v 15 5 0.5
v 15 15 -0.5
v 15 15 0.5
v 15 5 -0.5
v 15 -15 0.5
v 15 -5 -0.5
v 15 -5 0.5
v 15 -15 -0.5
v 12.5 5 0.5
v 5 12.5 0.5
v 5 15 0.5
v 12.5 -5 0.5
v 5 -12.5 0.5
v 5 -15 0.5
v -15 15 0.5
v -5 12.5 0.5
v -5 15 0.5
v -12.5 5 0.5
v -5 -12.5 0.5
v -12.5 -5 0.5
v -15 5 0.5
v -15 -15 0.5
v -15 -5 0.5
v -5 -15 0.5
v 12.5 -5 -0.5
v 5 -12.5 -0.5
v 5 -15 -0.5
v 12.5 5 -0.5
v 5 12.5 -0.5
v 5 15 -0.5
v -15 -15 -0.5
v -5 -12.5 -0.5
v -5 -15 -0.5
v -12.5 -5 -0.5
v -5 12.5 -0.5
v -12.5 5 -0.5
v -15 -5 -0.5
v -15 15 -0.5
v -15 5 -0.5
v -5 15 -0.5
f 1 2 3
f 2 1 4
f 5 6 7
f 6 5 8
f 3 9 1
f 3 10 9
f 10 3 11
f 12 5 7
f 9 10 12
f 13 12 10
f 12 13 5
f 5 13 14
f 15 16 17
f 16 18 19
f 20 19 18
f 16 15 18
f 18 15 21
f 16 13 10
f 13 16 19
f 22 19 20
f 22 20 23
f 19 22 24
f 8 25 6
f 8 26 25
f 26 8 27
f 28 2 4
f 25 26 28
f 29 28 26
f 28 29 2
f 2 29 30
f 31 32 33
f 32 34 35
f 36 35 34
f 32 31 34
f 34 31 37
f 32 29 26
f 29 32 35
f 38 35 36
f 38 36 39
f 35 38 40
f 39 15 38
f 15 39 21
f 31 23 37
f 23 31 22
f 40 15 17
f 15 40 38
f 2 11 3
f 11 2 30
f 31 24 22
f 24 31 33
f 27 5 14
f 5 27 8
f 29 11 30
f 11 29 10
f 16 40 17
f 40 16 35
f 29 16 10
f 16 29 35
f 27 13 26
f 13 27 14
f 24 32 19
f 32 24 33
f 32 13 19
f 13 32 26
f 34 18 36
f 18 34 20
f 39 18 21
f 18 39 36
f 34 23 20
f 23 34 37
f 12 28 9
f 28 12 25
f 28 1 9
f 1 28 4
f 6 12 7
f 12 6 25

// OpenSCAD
module tabbed_plate() {
    difference() {
        // Main plate
        cube([30, 30, 1], center=true);
        
        // Top tab
        translate([0, 15, 0])
            cube([10, 5, 1], center=true);
        
        // Bottom tab
        translate([0, -15, 0])
            cube([10, 5, 1], center=true);
        
        // Left tab
        translate([-15, 0, 0])
            cube([5, 10, 1], center=true);
        
        // Right tab
        translate([15, 0, 0])
            cube([5, 10, 1], center=true);
    }
}

tabbed_plate();
